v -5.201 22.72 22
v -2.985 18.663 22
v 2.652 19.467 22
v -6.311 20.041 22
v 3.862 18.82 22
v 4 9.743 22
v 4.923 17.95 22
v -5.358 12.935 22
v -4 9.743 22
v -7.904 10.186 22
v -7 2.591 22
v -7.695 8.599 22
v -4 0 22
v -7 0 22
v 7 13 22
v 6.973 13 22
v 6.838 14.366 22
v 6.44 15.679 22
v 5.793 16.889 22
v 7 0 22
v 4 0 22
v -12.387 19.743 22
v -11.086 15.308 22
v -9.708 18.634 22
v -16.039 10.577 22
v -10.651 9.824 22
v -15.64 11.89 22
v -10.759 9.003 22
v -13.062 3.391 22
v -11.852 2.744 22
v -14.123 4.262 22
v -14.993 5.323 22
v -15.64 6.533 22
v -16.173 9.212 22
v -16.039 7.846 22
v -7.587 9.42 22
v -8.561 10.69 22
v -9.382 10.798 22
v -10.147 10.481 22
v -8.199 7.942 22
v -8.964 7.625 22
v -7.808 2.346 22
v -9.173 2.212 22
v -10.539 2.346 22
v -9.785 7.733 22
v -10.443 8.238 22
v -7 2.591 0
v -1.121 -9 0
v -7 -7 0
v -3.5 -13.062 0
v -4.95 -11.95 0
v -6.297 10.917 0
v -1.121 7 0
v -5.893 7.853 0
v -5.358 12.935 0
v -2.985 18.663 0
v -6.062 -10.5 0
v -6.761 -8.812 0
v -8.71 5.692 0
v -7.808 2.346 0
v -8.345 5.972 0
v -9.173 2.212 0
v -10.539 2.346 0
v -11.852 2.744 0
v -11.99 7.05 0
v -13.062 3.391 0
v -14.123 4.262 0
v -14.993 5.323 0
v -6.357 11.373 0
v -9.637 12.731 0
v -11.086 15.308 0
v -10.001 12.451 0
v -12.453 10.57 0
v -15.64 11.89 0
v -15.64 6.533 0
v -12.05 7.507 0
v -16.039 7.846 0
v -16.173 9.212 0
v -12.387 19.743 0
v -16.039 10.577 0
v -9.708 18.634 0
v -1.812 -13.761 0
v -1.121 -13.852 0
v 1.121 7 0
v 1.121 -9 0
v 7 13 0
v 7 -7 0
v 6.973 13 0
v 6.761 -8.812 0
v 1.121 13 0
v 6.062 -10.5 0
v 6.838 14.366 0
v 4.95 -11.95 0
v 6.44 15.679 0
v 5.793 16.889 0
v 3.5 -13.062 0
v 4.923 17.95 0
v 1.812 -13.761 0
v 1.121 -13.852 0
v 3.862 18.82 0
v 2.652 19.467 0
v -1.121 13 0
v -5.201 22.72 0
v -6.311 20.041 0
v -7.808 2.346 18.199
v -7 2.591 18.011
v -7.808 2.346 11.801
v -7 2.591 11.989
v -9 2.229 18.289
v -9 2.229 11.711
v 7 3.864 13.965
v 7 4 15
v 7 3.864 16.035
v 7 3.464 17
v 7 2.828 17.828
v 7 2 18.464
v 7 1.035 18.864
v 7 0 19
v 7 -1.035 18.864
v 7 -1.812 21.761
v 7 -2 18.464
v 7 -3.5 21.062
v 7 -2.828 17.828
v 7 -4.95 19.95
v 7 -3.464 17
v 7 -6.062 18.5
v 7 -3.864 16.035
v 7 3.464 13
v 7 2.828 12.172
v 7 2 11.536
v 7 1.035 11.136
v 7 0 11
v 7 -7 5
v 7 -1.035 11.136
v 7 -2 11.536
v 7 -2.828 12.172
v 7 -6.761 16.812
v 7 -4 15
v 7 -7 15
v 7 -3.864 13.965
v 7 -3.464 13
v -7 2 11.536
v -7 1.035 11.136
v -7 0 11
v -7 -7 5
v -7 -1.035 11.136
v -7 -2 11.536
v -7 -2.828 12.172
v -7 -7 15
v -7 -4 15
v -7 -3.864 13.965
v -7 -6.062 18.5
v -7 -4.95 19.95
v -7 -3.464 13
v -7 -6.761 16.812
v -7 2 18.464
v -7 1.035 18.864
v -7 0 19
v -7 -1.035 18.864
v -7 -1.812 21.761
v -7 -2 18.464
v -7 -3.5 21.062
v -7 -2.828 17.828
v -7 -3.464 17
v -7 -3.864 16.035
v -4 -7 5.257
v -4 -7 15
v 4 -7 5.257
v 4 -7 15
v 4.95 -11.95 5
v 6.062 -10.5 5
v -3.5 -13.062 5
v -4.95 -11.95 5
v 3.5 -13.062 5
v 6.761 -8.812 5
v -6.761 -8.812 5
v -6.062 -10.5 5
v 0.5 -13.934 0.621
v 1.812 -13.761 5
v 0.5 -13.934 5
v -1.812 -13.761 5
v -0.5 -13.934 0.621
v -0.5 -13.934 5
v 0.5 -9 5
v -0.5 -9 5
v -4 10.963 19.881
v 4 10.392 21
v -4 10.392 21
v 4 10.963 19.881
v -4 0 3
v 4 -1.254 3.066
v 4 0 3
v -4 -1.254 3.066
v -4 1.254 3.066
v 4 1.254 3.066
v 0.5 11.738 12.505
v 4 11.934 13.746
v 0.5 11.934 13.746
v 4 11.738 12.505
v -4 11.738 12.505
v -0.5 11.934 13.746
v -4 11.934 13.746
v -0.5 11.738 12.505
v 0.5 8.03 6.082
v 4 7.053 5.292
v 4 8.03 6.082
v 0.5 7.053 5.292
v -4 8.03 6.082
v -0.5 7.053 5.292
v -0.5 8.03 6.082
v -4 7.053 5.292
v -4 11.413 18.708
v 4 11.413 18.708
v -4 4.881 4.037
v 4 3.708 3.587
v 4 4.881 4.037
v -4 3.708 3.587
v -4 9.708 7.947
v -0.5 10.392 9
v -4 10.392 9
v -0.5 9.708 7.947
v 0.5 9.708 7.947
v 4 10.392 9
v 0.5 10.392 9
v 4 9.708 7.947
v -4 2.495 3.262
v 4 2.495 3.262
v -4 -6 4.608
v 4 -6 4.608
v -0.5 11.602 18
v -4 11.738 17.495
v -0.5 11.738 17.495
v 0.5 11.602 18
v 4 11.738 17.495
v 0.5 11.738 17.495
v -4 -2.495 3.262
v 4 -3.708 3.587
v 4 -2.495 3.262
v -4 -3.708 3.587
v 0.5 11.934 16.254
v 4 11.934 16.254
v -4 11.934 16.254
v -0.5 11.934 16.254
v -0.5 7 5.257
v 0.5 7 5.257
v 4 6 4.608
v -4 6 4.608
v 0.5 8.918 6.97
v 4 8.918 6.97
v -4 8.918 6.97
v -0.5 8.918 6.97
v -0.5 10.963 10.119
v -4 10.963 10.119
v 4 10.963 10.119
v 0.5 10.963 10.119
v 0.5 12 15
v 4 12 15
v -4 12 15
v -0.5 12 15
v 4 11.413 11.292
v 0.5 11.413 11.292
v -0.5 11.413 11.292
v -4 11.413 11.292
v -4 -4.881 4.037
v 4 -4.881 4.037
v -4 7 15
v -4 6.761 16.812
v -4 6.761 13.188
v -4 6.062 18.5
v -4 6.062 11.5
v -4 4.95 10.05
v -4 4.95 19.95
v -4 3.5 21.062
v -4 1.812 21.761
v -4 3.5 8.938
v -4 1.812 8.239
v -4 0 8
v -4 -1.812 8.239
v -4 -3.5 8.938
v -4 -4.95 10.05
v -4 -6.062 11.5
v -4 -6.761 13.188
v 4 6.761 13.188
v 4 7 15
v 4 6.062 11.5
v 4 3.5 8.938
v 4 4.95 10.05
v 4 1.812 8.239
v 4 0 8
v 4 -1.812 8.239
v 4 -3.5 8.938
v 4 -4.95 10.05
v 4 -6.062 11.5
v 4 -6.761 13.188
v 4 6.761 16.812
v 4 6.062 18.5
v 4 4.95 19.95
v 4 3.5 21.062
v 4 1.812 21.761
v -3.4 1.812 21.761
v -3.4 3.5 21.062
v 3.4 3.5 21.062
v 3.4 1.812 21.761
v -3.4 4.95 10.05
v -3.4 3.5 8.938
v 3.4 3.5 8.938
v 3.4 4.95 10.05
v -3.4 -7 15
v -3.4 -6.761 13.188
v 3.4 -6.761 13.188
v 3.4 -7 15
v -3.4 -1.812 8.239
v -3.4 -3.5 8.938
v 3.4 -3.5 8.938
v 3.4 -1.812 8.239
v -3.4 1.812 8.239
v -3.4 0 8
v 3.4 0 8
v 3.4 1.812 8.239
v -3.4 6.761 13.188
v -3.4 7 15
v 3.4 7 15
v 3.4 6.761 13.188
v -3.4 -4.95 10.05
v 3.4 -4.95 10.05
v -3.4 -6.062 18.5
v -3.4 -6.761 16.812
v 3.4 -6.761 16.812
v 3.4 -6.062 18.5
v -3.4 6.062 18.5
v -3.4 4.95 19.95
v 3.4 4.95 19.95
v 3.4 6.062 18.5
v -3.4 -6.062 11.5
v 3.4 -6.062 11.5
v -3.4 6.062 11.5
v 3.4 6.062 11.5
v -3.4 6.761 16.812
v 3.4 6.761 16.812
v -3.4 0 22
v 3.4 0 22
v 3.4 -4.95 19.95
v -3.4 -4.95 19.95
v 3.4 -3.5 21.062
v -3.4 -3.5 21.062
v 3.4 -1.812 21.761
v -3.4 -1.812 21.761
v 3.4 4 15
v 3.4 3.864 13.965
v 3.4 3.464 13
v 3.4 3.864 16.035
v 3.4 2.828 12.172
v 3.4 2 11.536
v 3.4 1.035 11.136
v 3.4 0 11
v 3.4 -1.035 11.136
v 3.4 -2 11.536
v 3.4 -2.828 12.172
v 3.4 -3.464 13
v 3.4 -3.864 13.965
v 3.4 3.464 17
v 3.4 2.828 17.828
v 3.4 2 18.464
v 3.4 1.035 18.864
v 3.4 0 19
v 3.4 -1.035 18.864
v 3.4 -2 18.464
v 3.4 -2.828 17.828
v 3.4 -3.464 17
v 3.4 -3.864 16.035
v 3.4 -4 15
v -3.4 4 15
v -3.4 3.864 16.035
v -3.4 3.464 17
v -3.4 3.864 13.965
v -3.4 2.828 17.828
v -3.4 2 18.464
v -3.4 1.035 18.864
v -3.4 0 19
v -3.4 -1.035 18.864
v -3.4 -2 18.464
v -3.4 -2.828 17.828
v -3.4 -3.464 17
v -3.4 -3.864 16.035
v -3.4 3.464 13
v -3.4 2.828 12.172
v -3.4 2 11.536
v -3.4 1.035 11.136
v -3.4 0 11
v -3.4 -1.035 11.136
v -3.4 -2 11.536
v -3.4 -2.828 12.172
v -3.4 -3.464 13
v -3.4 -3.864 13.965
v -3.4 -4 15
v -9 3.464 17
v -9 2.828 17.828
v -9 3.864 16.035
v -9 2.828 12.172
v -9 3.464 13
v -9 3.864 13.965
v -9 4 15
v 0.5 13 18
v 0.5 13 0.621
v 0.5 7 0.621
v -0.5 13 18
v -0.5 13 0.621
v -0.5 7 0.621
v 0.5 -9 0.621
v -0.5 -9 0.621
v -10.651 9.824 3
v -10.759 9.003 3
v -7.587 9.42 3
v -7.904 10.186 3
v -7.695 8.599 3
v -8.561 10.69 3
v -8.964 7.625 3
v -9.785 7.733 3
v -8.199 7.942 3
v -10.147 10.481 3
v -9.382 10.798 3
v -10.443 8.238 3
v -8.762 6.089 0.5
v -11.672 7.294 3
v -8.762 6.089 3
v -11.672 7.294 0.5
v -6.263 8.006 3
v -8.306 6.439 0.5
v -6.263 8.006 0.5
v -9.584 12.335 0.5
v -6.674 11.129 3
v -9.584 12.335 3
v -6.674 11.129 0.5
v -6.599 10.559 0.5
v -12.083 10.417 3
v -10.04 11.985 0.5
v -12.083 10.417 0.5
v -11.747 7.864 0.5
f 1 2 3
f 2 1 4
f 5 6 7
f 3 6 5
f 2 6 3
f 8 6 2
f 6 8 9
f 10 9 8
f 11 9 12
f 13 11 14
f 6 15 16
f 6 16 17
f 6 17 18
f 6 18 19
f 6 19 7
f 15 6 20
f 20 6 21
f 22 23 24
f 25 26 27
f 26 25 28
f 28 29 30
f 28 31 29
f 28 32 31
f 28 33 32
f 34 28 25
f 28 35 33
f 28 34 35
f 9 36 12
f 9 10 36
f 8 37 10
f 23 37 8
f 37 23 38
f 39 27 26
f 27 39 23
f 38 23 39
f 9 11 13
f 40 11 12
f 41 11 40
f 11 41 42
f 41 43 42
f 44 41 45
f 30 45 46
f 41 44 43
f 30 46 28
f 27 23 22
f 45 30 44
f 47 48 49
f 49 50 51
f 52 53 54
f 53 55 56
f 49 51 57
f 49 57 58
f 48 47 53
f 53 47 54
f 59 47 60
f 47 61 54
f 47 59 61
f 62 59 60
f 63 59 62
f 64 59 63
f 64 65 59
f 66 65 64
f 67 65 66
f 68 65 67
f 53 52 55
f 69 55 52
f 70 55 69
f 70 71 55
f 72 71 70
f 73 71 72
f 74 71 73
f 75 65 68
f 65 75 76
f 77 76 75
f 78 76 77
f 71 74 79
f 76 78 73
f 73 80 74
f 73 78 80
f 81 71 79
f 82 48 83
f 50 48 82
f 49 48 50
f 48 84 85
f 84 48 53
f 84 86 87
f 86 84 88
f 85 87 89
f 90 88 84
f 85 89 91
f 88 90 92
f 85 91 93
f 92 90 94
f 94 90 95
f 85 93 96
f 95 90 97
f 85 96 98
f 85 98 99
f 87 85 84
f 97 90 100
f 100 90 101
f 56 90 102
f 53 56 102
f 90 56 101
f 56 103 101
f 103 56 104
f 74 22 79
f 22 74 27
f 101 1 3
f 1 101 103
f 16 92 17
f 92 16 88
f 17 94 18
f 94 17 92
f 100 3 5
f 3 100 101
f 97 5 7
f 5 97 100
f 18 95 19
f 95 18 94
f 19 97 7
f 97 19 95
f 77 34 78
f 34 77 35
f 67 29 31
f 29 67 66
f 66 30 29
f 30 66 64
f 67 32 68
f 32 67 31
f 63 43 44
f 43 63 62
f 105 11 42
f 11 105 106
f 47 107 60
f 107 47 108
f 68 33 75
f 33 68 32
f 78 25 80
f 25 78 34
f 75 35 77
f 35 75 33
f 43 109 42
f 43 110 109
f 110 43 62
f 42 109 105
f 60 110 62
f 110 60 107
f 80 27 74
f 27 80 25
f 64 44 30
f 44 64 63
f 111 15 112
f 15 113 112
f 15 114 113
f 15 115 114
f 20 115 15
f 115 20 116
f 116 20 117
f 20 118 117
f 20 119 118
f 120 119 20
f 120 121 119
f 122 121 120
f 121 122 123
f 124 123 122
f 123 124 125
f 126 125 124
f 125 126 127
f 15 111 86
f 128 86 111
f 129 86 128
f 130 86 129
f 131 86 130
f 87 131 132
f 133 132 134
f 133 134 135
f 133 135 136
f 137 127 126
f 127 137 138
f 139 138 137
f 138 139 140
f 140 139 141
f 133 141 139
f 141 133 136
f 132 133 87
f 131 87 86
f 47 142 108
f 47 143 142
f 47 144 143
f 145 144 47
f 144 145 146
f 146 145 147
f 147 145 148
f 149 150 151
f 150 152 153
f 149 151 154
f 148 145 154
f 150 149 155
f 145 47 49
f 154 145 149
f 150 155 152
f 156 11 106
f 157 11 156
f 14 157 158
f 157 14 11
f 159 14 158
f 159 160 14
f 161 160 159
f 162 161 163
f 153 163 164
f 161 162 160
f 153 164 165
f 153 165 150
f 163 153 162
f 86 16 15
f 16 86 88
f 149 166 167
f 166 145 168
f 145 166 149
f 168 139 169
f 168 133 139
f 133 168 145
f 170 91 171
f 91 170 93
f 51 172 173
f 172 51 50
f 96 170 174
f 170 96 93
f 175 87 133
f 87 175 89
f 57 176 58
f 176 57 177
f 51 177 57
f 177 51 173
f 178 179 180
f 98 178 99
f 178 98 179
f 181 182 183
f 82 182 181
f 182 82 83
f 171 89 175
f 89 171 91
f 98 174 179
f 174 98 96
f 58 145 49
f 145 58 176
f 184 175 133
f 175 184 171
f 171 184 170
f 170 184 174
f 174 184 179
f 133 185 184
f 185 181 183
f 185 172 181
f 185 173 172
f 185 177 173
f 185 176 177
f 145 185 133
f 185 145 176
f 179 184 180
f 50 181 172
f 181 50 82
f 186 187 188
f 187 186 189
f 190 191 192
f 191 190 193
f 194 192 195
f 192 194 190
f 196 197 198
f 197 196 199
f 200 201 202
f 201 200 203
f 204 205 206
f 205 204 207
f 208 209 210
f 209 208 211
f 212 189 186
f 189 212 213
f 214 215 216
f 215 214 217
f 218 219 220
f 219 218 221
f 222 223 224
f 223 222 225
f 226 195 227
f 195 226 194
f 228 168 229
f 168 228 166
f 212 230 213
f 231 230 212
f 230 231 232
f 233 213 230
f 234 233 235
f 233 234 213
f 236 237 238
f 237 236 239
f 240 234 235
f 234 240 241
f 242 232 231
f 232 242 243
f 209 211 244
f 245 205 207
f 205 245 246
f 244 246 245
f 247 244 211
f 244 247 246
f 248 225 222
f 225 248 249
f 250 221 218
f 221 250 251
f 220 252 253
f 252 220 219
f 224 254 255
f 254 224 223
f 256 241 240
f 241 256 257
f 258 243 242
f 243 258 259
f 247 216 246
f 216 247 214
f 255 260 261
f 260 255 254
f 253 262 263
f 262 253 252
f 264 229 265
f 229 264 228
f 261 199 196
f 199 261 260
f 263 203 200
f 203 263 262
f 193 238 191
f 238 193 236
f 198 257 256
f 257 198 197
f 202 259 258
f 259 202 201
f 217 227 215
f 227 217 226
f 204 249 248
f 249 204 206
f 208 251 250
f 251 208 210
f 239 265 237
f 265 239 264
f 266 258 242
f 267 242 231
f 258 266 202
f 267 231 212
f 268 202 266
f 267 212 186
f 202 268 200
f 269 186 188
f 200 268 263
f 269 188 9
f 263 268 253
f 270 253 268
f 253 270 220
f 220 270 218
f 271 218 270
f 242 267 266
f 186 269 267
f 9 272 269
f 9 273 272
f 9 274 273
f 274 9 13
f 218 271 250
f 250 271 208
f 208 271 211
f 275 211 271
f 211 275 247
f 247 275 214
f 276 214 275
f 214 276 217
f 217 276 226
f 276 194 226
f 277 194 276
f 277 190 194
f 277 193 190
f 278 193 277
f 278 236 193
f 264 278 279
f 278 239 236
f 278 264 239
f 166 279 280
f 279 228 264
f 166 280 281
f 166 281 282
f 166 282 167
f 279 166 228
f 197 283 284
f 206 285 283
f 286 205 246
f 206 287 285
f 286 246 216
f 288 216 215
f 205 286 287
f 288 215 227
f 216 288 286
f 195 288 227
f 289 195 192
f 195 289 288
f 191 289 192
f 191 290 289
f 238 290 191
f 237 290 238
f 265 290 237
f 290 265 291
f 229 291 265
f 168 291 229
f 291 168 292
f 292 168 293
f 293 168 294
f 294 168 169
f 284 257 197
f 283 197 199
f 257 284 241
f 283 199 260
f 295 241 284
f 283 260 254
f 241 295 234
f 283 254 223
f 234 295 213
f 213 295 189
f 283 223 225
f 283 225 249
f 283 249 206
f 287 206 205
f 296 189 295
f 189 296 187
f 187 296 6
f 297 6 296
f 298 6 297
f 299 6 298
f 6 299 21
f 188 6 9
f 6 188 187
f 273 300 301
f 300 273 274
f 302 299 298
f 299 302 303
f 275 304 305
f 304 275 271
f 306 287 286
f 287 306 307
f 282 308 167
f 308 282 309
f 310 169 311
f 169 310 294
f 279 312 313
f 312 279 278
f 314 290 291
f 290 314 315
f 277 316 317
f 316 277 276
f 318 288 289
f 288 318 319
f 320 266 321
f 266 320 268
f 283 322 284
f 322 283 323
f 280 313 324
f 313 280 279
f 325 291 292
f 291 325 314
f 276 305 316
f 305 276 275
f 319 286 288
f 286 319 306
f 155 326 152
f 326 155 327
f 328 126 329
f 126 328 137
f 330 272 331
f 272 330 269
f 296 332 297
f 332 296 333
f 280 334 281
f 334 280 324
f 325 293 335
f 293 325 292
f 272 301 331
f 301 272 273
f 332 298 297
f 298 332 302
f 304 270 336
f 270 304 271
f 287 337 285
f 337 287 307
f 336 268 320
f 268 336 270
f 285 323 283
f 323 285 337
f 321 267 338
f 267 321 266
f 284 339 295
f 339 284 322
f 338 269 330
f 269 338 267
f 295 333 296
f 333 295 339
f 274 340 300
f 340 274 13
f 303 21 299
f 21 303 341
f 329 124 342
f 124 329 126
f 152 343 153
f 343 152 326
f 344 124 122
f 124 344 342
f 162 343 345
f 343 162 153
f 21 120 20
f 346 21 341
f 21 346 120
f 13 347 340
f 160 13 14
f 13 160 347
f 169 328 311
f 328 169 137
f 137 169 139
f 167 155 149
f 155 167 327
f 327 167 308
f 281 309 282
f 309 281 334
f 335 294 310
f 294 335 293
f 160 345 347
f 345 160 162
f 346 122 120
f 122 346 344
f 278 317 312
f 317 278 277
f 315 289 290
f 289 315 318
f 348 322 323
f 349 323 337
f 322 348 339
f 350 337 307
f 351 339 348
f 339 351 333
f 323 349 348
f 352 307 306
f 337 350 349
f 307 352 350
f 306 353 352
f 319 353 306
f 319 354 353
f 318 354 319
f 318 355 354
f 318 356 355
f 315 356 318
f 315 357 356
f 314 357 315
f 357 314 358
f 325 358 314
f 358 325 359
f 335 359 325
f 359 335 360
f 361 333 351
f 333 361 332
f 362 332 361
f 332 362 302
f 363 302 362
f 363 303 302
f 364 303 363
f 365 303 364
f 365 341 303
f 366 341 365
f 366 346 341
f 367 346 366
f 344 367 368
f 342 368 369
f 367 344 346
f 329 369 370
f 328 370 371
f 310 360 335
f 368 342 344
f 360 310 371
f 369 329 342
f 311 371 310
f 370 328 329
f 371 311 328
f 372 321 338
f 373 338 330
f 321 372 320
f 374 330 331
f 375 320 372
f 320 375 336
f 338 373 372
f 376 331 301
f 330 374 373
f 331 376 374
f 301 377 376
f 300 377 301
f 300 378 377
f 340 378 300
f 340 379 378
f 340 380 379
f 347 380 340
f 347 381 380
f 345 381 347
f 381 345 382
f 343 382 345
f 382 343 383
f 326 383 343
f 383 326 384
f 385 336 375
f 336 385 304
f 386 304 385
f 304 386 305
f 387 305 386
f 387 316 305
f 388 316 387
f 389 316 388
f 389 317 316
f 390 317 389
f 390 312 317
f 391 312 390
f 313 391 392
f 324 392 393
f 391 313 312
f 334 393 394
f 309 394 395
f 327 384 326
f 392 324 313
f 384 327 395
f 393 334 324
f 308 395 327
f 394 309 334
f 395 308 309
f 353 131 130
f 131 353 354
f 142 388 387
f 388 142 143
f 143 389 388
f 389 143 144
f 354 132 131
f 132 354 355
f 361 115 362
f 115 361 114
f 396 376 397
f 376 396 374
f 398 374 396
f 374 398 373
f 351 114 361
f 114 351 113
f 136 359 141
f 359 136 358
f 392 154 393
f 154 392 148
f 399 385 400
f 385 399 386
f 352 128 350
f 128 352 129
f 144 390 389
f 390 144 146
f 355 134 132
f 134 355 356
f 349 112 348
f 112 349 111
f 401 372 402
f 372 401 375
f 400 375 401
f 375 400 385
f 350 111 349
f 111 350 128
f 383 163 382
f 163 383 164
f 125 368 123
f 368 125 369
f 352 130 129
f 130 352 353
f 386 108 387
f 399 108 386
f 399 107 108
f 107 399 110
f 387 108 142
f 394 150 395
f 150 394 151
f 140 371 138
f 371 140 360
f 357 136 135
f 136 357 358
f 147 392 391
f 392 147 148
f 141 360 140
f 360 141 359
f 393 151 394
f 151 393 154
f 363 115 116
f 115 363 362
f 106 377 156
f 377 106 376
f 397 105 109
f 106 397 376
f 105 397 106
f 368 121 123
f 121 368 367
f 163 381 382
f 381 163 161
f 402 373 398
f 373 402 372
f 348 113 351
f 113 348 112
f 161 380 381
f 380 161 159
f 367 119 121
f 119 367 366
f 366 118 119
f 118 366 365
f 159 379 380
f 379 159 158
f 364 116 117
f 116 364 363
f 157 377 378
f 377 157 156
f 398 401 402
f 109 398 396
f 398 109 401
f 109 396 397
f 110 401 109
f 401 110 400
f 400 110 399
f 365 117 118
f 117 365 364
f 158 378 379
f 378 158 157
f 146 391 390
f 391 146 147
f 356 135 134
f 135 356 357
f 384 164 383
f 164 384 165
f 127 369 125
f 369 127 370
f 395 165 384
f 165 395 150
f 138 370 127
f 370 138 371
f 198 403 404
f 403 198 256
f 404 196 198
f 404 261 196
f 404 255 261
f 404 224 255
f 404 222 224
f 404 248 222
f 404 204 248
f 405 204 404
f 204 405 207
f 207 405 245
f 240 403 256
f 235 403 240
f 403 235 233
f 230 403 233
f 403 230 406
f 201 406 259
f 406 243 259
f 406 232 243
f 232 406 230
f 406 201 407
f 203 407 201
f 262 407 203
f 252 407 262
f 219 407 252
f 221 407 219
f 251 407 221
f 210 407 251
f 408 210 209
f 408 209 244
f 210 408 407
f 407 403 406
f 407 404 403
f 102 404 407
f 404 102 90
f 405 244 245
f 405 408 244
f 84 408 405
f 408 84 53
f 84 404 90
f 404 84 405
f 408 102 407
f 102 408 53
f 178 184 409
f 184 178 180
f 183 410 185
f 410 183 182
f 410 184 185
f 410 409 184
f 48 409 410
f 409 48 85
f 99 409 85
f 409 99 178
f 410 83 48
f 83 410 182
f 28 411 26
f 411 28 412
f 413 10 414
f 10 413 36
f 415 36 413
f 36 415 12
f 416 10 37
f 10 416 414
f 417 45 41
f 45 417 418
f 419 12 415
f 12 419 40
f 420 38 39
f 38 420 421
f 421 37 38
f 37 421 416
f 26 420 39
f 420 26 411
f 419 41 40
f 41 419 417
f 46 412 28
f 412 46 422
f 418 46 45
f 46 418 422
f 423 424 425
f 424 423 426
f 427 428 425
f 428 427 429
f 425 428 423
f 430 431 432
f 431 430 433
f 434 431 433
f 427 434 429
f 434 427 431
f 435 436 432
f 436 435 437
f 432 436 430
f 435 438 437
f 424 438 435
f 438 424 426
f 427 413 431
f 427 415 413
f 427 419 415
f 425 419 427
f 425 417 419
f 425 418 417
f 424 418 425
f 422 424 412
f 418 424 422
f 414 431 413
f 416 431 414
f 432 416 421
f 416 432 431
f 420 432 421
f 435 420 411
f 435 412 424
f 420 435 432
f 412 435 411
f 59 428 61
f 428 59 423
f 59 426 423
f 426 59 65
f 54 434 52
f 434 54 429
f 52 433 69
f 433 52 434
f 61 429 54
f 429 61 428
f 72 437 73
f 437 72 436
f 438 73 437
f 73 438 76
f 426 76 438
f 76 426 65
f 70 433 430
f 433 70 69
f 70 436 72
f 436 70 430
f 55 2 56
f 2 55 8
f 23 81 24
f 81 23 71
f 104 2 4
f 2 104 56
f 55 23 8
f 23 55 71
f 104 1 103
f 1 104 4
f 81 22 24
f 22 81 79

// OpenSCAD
// file: configuration.scad
// OD = outside diameter, corner to corner.
m3_nut_od = 6.1;
m3_nut_radius = (m3_nut_od+0.2)/2;

// Major diameter of metric 3mm thread.
m3_major = 2.85;
m3_radius = m3_major/2;
m3_wide_radius = 3.2/2;

// NEMA17 stepper motors.
motor_shaft_diameter = 5;
motor_shaft_radius = (motor_shaft_diameter+0.3)/2;

// Frame brackets.
thickness = 3.6;
// main file
include <configuration.scad>;

offset_x = -12;
offset_y = 12;
rotate_z = -22.5;

module tensioner_608() {
  difference() {
    union() {
      difference() {
        union() {
	  rotate([0, 0, rotate_z]) translate([offset_x, offset_y, -4]) {
	    cube([14, 14, 22], center=true);
	    translate([7, 0, 0]) cylinder(r=7, h=22, center=true, $fn=32);
	    translate([0, -7, 0]) cylinder(r=7, h=22, center=true, $fn=32);
	  }
          translate([0, 3, -4]) cube([14, 20, 22], center=true);
          translate([0, -7, -12.5]) cylinder(r=7, h=5, center=true, $fn=24);
        }
        translate([0, -11, 11]) cube([18, 22, 22], center=true);
        rotate([0, 90, 0]) cylinder(r=12, h=8, center=true, $fn=60);
      }
      rotate([0, 90, 0]) cylinder(r=7, h=14, center=true, $fn=24);
    }
    rotate([0, 90, 0]) {
      cylinder(r=11, h=6.8, center=true);
      cylinder(r=4, h=18, center=true, $fn=24);
    }
    for (y = [10, -12]) {
      translate([0, y, -7]) cube([1, 6, 20], center=true);
      translate([0, y, -16]) rotate([0, 45, 0]) cube([3, 6, 3], center=true);
    }
    rotate([0, 0, rotate_z]) translate([offset_x, offset_y, -4]) {
      // OpenBeam groove slider.
      translate([-1, 1, 0]) cube([6.2, 6.2, 23], center=true);
      translate([-6, 6, 0]) cube([9, 9, 23], center=true);
      // Vertical M3 screw for tension.
      translate([0, -7, -8]) scale([1, 1, -1]) {
	cylinder(r=m3_wide_radius, h=50, center=true, $fn=12);
	cylinder(r=m3_nut_radius, h=5, $fn=6);
	cylinder(r1=m3_nut_radius-2, r2=m3_nut_radius+2, h=5, $fn=6);
      }
    }
  }
}

translate([0, 0, 15]) {
  tensioner_608();
  % rotate([0, 90, 0]) cylinder(r=11, h=7, center=true);
}
